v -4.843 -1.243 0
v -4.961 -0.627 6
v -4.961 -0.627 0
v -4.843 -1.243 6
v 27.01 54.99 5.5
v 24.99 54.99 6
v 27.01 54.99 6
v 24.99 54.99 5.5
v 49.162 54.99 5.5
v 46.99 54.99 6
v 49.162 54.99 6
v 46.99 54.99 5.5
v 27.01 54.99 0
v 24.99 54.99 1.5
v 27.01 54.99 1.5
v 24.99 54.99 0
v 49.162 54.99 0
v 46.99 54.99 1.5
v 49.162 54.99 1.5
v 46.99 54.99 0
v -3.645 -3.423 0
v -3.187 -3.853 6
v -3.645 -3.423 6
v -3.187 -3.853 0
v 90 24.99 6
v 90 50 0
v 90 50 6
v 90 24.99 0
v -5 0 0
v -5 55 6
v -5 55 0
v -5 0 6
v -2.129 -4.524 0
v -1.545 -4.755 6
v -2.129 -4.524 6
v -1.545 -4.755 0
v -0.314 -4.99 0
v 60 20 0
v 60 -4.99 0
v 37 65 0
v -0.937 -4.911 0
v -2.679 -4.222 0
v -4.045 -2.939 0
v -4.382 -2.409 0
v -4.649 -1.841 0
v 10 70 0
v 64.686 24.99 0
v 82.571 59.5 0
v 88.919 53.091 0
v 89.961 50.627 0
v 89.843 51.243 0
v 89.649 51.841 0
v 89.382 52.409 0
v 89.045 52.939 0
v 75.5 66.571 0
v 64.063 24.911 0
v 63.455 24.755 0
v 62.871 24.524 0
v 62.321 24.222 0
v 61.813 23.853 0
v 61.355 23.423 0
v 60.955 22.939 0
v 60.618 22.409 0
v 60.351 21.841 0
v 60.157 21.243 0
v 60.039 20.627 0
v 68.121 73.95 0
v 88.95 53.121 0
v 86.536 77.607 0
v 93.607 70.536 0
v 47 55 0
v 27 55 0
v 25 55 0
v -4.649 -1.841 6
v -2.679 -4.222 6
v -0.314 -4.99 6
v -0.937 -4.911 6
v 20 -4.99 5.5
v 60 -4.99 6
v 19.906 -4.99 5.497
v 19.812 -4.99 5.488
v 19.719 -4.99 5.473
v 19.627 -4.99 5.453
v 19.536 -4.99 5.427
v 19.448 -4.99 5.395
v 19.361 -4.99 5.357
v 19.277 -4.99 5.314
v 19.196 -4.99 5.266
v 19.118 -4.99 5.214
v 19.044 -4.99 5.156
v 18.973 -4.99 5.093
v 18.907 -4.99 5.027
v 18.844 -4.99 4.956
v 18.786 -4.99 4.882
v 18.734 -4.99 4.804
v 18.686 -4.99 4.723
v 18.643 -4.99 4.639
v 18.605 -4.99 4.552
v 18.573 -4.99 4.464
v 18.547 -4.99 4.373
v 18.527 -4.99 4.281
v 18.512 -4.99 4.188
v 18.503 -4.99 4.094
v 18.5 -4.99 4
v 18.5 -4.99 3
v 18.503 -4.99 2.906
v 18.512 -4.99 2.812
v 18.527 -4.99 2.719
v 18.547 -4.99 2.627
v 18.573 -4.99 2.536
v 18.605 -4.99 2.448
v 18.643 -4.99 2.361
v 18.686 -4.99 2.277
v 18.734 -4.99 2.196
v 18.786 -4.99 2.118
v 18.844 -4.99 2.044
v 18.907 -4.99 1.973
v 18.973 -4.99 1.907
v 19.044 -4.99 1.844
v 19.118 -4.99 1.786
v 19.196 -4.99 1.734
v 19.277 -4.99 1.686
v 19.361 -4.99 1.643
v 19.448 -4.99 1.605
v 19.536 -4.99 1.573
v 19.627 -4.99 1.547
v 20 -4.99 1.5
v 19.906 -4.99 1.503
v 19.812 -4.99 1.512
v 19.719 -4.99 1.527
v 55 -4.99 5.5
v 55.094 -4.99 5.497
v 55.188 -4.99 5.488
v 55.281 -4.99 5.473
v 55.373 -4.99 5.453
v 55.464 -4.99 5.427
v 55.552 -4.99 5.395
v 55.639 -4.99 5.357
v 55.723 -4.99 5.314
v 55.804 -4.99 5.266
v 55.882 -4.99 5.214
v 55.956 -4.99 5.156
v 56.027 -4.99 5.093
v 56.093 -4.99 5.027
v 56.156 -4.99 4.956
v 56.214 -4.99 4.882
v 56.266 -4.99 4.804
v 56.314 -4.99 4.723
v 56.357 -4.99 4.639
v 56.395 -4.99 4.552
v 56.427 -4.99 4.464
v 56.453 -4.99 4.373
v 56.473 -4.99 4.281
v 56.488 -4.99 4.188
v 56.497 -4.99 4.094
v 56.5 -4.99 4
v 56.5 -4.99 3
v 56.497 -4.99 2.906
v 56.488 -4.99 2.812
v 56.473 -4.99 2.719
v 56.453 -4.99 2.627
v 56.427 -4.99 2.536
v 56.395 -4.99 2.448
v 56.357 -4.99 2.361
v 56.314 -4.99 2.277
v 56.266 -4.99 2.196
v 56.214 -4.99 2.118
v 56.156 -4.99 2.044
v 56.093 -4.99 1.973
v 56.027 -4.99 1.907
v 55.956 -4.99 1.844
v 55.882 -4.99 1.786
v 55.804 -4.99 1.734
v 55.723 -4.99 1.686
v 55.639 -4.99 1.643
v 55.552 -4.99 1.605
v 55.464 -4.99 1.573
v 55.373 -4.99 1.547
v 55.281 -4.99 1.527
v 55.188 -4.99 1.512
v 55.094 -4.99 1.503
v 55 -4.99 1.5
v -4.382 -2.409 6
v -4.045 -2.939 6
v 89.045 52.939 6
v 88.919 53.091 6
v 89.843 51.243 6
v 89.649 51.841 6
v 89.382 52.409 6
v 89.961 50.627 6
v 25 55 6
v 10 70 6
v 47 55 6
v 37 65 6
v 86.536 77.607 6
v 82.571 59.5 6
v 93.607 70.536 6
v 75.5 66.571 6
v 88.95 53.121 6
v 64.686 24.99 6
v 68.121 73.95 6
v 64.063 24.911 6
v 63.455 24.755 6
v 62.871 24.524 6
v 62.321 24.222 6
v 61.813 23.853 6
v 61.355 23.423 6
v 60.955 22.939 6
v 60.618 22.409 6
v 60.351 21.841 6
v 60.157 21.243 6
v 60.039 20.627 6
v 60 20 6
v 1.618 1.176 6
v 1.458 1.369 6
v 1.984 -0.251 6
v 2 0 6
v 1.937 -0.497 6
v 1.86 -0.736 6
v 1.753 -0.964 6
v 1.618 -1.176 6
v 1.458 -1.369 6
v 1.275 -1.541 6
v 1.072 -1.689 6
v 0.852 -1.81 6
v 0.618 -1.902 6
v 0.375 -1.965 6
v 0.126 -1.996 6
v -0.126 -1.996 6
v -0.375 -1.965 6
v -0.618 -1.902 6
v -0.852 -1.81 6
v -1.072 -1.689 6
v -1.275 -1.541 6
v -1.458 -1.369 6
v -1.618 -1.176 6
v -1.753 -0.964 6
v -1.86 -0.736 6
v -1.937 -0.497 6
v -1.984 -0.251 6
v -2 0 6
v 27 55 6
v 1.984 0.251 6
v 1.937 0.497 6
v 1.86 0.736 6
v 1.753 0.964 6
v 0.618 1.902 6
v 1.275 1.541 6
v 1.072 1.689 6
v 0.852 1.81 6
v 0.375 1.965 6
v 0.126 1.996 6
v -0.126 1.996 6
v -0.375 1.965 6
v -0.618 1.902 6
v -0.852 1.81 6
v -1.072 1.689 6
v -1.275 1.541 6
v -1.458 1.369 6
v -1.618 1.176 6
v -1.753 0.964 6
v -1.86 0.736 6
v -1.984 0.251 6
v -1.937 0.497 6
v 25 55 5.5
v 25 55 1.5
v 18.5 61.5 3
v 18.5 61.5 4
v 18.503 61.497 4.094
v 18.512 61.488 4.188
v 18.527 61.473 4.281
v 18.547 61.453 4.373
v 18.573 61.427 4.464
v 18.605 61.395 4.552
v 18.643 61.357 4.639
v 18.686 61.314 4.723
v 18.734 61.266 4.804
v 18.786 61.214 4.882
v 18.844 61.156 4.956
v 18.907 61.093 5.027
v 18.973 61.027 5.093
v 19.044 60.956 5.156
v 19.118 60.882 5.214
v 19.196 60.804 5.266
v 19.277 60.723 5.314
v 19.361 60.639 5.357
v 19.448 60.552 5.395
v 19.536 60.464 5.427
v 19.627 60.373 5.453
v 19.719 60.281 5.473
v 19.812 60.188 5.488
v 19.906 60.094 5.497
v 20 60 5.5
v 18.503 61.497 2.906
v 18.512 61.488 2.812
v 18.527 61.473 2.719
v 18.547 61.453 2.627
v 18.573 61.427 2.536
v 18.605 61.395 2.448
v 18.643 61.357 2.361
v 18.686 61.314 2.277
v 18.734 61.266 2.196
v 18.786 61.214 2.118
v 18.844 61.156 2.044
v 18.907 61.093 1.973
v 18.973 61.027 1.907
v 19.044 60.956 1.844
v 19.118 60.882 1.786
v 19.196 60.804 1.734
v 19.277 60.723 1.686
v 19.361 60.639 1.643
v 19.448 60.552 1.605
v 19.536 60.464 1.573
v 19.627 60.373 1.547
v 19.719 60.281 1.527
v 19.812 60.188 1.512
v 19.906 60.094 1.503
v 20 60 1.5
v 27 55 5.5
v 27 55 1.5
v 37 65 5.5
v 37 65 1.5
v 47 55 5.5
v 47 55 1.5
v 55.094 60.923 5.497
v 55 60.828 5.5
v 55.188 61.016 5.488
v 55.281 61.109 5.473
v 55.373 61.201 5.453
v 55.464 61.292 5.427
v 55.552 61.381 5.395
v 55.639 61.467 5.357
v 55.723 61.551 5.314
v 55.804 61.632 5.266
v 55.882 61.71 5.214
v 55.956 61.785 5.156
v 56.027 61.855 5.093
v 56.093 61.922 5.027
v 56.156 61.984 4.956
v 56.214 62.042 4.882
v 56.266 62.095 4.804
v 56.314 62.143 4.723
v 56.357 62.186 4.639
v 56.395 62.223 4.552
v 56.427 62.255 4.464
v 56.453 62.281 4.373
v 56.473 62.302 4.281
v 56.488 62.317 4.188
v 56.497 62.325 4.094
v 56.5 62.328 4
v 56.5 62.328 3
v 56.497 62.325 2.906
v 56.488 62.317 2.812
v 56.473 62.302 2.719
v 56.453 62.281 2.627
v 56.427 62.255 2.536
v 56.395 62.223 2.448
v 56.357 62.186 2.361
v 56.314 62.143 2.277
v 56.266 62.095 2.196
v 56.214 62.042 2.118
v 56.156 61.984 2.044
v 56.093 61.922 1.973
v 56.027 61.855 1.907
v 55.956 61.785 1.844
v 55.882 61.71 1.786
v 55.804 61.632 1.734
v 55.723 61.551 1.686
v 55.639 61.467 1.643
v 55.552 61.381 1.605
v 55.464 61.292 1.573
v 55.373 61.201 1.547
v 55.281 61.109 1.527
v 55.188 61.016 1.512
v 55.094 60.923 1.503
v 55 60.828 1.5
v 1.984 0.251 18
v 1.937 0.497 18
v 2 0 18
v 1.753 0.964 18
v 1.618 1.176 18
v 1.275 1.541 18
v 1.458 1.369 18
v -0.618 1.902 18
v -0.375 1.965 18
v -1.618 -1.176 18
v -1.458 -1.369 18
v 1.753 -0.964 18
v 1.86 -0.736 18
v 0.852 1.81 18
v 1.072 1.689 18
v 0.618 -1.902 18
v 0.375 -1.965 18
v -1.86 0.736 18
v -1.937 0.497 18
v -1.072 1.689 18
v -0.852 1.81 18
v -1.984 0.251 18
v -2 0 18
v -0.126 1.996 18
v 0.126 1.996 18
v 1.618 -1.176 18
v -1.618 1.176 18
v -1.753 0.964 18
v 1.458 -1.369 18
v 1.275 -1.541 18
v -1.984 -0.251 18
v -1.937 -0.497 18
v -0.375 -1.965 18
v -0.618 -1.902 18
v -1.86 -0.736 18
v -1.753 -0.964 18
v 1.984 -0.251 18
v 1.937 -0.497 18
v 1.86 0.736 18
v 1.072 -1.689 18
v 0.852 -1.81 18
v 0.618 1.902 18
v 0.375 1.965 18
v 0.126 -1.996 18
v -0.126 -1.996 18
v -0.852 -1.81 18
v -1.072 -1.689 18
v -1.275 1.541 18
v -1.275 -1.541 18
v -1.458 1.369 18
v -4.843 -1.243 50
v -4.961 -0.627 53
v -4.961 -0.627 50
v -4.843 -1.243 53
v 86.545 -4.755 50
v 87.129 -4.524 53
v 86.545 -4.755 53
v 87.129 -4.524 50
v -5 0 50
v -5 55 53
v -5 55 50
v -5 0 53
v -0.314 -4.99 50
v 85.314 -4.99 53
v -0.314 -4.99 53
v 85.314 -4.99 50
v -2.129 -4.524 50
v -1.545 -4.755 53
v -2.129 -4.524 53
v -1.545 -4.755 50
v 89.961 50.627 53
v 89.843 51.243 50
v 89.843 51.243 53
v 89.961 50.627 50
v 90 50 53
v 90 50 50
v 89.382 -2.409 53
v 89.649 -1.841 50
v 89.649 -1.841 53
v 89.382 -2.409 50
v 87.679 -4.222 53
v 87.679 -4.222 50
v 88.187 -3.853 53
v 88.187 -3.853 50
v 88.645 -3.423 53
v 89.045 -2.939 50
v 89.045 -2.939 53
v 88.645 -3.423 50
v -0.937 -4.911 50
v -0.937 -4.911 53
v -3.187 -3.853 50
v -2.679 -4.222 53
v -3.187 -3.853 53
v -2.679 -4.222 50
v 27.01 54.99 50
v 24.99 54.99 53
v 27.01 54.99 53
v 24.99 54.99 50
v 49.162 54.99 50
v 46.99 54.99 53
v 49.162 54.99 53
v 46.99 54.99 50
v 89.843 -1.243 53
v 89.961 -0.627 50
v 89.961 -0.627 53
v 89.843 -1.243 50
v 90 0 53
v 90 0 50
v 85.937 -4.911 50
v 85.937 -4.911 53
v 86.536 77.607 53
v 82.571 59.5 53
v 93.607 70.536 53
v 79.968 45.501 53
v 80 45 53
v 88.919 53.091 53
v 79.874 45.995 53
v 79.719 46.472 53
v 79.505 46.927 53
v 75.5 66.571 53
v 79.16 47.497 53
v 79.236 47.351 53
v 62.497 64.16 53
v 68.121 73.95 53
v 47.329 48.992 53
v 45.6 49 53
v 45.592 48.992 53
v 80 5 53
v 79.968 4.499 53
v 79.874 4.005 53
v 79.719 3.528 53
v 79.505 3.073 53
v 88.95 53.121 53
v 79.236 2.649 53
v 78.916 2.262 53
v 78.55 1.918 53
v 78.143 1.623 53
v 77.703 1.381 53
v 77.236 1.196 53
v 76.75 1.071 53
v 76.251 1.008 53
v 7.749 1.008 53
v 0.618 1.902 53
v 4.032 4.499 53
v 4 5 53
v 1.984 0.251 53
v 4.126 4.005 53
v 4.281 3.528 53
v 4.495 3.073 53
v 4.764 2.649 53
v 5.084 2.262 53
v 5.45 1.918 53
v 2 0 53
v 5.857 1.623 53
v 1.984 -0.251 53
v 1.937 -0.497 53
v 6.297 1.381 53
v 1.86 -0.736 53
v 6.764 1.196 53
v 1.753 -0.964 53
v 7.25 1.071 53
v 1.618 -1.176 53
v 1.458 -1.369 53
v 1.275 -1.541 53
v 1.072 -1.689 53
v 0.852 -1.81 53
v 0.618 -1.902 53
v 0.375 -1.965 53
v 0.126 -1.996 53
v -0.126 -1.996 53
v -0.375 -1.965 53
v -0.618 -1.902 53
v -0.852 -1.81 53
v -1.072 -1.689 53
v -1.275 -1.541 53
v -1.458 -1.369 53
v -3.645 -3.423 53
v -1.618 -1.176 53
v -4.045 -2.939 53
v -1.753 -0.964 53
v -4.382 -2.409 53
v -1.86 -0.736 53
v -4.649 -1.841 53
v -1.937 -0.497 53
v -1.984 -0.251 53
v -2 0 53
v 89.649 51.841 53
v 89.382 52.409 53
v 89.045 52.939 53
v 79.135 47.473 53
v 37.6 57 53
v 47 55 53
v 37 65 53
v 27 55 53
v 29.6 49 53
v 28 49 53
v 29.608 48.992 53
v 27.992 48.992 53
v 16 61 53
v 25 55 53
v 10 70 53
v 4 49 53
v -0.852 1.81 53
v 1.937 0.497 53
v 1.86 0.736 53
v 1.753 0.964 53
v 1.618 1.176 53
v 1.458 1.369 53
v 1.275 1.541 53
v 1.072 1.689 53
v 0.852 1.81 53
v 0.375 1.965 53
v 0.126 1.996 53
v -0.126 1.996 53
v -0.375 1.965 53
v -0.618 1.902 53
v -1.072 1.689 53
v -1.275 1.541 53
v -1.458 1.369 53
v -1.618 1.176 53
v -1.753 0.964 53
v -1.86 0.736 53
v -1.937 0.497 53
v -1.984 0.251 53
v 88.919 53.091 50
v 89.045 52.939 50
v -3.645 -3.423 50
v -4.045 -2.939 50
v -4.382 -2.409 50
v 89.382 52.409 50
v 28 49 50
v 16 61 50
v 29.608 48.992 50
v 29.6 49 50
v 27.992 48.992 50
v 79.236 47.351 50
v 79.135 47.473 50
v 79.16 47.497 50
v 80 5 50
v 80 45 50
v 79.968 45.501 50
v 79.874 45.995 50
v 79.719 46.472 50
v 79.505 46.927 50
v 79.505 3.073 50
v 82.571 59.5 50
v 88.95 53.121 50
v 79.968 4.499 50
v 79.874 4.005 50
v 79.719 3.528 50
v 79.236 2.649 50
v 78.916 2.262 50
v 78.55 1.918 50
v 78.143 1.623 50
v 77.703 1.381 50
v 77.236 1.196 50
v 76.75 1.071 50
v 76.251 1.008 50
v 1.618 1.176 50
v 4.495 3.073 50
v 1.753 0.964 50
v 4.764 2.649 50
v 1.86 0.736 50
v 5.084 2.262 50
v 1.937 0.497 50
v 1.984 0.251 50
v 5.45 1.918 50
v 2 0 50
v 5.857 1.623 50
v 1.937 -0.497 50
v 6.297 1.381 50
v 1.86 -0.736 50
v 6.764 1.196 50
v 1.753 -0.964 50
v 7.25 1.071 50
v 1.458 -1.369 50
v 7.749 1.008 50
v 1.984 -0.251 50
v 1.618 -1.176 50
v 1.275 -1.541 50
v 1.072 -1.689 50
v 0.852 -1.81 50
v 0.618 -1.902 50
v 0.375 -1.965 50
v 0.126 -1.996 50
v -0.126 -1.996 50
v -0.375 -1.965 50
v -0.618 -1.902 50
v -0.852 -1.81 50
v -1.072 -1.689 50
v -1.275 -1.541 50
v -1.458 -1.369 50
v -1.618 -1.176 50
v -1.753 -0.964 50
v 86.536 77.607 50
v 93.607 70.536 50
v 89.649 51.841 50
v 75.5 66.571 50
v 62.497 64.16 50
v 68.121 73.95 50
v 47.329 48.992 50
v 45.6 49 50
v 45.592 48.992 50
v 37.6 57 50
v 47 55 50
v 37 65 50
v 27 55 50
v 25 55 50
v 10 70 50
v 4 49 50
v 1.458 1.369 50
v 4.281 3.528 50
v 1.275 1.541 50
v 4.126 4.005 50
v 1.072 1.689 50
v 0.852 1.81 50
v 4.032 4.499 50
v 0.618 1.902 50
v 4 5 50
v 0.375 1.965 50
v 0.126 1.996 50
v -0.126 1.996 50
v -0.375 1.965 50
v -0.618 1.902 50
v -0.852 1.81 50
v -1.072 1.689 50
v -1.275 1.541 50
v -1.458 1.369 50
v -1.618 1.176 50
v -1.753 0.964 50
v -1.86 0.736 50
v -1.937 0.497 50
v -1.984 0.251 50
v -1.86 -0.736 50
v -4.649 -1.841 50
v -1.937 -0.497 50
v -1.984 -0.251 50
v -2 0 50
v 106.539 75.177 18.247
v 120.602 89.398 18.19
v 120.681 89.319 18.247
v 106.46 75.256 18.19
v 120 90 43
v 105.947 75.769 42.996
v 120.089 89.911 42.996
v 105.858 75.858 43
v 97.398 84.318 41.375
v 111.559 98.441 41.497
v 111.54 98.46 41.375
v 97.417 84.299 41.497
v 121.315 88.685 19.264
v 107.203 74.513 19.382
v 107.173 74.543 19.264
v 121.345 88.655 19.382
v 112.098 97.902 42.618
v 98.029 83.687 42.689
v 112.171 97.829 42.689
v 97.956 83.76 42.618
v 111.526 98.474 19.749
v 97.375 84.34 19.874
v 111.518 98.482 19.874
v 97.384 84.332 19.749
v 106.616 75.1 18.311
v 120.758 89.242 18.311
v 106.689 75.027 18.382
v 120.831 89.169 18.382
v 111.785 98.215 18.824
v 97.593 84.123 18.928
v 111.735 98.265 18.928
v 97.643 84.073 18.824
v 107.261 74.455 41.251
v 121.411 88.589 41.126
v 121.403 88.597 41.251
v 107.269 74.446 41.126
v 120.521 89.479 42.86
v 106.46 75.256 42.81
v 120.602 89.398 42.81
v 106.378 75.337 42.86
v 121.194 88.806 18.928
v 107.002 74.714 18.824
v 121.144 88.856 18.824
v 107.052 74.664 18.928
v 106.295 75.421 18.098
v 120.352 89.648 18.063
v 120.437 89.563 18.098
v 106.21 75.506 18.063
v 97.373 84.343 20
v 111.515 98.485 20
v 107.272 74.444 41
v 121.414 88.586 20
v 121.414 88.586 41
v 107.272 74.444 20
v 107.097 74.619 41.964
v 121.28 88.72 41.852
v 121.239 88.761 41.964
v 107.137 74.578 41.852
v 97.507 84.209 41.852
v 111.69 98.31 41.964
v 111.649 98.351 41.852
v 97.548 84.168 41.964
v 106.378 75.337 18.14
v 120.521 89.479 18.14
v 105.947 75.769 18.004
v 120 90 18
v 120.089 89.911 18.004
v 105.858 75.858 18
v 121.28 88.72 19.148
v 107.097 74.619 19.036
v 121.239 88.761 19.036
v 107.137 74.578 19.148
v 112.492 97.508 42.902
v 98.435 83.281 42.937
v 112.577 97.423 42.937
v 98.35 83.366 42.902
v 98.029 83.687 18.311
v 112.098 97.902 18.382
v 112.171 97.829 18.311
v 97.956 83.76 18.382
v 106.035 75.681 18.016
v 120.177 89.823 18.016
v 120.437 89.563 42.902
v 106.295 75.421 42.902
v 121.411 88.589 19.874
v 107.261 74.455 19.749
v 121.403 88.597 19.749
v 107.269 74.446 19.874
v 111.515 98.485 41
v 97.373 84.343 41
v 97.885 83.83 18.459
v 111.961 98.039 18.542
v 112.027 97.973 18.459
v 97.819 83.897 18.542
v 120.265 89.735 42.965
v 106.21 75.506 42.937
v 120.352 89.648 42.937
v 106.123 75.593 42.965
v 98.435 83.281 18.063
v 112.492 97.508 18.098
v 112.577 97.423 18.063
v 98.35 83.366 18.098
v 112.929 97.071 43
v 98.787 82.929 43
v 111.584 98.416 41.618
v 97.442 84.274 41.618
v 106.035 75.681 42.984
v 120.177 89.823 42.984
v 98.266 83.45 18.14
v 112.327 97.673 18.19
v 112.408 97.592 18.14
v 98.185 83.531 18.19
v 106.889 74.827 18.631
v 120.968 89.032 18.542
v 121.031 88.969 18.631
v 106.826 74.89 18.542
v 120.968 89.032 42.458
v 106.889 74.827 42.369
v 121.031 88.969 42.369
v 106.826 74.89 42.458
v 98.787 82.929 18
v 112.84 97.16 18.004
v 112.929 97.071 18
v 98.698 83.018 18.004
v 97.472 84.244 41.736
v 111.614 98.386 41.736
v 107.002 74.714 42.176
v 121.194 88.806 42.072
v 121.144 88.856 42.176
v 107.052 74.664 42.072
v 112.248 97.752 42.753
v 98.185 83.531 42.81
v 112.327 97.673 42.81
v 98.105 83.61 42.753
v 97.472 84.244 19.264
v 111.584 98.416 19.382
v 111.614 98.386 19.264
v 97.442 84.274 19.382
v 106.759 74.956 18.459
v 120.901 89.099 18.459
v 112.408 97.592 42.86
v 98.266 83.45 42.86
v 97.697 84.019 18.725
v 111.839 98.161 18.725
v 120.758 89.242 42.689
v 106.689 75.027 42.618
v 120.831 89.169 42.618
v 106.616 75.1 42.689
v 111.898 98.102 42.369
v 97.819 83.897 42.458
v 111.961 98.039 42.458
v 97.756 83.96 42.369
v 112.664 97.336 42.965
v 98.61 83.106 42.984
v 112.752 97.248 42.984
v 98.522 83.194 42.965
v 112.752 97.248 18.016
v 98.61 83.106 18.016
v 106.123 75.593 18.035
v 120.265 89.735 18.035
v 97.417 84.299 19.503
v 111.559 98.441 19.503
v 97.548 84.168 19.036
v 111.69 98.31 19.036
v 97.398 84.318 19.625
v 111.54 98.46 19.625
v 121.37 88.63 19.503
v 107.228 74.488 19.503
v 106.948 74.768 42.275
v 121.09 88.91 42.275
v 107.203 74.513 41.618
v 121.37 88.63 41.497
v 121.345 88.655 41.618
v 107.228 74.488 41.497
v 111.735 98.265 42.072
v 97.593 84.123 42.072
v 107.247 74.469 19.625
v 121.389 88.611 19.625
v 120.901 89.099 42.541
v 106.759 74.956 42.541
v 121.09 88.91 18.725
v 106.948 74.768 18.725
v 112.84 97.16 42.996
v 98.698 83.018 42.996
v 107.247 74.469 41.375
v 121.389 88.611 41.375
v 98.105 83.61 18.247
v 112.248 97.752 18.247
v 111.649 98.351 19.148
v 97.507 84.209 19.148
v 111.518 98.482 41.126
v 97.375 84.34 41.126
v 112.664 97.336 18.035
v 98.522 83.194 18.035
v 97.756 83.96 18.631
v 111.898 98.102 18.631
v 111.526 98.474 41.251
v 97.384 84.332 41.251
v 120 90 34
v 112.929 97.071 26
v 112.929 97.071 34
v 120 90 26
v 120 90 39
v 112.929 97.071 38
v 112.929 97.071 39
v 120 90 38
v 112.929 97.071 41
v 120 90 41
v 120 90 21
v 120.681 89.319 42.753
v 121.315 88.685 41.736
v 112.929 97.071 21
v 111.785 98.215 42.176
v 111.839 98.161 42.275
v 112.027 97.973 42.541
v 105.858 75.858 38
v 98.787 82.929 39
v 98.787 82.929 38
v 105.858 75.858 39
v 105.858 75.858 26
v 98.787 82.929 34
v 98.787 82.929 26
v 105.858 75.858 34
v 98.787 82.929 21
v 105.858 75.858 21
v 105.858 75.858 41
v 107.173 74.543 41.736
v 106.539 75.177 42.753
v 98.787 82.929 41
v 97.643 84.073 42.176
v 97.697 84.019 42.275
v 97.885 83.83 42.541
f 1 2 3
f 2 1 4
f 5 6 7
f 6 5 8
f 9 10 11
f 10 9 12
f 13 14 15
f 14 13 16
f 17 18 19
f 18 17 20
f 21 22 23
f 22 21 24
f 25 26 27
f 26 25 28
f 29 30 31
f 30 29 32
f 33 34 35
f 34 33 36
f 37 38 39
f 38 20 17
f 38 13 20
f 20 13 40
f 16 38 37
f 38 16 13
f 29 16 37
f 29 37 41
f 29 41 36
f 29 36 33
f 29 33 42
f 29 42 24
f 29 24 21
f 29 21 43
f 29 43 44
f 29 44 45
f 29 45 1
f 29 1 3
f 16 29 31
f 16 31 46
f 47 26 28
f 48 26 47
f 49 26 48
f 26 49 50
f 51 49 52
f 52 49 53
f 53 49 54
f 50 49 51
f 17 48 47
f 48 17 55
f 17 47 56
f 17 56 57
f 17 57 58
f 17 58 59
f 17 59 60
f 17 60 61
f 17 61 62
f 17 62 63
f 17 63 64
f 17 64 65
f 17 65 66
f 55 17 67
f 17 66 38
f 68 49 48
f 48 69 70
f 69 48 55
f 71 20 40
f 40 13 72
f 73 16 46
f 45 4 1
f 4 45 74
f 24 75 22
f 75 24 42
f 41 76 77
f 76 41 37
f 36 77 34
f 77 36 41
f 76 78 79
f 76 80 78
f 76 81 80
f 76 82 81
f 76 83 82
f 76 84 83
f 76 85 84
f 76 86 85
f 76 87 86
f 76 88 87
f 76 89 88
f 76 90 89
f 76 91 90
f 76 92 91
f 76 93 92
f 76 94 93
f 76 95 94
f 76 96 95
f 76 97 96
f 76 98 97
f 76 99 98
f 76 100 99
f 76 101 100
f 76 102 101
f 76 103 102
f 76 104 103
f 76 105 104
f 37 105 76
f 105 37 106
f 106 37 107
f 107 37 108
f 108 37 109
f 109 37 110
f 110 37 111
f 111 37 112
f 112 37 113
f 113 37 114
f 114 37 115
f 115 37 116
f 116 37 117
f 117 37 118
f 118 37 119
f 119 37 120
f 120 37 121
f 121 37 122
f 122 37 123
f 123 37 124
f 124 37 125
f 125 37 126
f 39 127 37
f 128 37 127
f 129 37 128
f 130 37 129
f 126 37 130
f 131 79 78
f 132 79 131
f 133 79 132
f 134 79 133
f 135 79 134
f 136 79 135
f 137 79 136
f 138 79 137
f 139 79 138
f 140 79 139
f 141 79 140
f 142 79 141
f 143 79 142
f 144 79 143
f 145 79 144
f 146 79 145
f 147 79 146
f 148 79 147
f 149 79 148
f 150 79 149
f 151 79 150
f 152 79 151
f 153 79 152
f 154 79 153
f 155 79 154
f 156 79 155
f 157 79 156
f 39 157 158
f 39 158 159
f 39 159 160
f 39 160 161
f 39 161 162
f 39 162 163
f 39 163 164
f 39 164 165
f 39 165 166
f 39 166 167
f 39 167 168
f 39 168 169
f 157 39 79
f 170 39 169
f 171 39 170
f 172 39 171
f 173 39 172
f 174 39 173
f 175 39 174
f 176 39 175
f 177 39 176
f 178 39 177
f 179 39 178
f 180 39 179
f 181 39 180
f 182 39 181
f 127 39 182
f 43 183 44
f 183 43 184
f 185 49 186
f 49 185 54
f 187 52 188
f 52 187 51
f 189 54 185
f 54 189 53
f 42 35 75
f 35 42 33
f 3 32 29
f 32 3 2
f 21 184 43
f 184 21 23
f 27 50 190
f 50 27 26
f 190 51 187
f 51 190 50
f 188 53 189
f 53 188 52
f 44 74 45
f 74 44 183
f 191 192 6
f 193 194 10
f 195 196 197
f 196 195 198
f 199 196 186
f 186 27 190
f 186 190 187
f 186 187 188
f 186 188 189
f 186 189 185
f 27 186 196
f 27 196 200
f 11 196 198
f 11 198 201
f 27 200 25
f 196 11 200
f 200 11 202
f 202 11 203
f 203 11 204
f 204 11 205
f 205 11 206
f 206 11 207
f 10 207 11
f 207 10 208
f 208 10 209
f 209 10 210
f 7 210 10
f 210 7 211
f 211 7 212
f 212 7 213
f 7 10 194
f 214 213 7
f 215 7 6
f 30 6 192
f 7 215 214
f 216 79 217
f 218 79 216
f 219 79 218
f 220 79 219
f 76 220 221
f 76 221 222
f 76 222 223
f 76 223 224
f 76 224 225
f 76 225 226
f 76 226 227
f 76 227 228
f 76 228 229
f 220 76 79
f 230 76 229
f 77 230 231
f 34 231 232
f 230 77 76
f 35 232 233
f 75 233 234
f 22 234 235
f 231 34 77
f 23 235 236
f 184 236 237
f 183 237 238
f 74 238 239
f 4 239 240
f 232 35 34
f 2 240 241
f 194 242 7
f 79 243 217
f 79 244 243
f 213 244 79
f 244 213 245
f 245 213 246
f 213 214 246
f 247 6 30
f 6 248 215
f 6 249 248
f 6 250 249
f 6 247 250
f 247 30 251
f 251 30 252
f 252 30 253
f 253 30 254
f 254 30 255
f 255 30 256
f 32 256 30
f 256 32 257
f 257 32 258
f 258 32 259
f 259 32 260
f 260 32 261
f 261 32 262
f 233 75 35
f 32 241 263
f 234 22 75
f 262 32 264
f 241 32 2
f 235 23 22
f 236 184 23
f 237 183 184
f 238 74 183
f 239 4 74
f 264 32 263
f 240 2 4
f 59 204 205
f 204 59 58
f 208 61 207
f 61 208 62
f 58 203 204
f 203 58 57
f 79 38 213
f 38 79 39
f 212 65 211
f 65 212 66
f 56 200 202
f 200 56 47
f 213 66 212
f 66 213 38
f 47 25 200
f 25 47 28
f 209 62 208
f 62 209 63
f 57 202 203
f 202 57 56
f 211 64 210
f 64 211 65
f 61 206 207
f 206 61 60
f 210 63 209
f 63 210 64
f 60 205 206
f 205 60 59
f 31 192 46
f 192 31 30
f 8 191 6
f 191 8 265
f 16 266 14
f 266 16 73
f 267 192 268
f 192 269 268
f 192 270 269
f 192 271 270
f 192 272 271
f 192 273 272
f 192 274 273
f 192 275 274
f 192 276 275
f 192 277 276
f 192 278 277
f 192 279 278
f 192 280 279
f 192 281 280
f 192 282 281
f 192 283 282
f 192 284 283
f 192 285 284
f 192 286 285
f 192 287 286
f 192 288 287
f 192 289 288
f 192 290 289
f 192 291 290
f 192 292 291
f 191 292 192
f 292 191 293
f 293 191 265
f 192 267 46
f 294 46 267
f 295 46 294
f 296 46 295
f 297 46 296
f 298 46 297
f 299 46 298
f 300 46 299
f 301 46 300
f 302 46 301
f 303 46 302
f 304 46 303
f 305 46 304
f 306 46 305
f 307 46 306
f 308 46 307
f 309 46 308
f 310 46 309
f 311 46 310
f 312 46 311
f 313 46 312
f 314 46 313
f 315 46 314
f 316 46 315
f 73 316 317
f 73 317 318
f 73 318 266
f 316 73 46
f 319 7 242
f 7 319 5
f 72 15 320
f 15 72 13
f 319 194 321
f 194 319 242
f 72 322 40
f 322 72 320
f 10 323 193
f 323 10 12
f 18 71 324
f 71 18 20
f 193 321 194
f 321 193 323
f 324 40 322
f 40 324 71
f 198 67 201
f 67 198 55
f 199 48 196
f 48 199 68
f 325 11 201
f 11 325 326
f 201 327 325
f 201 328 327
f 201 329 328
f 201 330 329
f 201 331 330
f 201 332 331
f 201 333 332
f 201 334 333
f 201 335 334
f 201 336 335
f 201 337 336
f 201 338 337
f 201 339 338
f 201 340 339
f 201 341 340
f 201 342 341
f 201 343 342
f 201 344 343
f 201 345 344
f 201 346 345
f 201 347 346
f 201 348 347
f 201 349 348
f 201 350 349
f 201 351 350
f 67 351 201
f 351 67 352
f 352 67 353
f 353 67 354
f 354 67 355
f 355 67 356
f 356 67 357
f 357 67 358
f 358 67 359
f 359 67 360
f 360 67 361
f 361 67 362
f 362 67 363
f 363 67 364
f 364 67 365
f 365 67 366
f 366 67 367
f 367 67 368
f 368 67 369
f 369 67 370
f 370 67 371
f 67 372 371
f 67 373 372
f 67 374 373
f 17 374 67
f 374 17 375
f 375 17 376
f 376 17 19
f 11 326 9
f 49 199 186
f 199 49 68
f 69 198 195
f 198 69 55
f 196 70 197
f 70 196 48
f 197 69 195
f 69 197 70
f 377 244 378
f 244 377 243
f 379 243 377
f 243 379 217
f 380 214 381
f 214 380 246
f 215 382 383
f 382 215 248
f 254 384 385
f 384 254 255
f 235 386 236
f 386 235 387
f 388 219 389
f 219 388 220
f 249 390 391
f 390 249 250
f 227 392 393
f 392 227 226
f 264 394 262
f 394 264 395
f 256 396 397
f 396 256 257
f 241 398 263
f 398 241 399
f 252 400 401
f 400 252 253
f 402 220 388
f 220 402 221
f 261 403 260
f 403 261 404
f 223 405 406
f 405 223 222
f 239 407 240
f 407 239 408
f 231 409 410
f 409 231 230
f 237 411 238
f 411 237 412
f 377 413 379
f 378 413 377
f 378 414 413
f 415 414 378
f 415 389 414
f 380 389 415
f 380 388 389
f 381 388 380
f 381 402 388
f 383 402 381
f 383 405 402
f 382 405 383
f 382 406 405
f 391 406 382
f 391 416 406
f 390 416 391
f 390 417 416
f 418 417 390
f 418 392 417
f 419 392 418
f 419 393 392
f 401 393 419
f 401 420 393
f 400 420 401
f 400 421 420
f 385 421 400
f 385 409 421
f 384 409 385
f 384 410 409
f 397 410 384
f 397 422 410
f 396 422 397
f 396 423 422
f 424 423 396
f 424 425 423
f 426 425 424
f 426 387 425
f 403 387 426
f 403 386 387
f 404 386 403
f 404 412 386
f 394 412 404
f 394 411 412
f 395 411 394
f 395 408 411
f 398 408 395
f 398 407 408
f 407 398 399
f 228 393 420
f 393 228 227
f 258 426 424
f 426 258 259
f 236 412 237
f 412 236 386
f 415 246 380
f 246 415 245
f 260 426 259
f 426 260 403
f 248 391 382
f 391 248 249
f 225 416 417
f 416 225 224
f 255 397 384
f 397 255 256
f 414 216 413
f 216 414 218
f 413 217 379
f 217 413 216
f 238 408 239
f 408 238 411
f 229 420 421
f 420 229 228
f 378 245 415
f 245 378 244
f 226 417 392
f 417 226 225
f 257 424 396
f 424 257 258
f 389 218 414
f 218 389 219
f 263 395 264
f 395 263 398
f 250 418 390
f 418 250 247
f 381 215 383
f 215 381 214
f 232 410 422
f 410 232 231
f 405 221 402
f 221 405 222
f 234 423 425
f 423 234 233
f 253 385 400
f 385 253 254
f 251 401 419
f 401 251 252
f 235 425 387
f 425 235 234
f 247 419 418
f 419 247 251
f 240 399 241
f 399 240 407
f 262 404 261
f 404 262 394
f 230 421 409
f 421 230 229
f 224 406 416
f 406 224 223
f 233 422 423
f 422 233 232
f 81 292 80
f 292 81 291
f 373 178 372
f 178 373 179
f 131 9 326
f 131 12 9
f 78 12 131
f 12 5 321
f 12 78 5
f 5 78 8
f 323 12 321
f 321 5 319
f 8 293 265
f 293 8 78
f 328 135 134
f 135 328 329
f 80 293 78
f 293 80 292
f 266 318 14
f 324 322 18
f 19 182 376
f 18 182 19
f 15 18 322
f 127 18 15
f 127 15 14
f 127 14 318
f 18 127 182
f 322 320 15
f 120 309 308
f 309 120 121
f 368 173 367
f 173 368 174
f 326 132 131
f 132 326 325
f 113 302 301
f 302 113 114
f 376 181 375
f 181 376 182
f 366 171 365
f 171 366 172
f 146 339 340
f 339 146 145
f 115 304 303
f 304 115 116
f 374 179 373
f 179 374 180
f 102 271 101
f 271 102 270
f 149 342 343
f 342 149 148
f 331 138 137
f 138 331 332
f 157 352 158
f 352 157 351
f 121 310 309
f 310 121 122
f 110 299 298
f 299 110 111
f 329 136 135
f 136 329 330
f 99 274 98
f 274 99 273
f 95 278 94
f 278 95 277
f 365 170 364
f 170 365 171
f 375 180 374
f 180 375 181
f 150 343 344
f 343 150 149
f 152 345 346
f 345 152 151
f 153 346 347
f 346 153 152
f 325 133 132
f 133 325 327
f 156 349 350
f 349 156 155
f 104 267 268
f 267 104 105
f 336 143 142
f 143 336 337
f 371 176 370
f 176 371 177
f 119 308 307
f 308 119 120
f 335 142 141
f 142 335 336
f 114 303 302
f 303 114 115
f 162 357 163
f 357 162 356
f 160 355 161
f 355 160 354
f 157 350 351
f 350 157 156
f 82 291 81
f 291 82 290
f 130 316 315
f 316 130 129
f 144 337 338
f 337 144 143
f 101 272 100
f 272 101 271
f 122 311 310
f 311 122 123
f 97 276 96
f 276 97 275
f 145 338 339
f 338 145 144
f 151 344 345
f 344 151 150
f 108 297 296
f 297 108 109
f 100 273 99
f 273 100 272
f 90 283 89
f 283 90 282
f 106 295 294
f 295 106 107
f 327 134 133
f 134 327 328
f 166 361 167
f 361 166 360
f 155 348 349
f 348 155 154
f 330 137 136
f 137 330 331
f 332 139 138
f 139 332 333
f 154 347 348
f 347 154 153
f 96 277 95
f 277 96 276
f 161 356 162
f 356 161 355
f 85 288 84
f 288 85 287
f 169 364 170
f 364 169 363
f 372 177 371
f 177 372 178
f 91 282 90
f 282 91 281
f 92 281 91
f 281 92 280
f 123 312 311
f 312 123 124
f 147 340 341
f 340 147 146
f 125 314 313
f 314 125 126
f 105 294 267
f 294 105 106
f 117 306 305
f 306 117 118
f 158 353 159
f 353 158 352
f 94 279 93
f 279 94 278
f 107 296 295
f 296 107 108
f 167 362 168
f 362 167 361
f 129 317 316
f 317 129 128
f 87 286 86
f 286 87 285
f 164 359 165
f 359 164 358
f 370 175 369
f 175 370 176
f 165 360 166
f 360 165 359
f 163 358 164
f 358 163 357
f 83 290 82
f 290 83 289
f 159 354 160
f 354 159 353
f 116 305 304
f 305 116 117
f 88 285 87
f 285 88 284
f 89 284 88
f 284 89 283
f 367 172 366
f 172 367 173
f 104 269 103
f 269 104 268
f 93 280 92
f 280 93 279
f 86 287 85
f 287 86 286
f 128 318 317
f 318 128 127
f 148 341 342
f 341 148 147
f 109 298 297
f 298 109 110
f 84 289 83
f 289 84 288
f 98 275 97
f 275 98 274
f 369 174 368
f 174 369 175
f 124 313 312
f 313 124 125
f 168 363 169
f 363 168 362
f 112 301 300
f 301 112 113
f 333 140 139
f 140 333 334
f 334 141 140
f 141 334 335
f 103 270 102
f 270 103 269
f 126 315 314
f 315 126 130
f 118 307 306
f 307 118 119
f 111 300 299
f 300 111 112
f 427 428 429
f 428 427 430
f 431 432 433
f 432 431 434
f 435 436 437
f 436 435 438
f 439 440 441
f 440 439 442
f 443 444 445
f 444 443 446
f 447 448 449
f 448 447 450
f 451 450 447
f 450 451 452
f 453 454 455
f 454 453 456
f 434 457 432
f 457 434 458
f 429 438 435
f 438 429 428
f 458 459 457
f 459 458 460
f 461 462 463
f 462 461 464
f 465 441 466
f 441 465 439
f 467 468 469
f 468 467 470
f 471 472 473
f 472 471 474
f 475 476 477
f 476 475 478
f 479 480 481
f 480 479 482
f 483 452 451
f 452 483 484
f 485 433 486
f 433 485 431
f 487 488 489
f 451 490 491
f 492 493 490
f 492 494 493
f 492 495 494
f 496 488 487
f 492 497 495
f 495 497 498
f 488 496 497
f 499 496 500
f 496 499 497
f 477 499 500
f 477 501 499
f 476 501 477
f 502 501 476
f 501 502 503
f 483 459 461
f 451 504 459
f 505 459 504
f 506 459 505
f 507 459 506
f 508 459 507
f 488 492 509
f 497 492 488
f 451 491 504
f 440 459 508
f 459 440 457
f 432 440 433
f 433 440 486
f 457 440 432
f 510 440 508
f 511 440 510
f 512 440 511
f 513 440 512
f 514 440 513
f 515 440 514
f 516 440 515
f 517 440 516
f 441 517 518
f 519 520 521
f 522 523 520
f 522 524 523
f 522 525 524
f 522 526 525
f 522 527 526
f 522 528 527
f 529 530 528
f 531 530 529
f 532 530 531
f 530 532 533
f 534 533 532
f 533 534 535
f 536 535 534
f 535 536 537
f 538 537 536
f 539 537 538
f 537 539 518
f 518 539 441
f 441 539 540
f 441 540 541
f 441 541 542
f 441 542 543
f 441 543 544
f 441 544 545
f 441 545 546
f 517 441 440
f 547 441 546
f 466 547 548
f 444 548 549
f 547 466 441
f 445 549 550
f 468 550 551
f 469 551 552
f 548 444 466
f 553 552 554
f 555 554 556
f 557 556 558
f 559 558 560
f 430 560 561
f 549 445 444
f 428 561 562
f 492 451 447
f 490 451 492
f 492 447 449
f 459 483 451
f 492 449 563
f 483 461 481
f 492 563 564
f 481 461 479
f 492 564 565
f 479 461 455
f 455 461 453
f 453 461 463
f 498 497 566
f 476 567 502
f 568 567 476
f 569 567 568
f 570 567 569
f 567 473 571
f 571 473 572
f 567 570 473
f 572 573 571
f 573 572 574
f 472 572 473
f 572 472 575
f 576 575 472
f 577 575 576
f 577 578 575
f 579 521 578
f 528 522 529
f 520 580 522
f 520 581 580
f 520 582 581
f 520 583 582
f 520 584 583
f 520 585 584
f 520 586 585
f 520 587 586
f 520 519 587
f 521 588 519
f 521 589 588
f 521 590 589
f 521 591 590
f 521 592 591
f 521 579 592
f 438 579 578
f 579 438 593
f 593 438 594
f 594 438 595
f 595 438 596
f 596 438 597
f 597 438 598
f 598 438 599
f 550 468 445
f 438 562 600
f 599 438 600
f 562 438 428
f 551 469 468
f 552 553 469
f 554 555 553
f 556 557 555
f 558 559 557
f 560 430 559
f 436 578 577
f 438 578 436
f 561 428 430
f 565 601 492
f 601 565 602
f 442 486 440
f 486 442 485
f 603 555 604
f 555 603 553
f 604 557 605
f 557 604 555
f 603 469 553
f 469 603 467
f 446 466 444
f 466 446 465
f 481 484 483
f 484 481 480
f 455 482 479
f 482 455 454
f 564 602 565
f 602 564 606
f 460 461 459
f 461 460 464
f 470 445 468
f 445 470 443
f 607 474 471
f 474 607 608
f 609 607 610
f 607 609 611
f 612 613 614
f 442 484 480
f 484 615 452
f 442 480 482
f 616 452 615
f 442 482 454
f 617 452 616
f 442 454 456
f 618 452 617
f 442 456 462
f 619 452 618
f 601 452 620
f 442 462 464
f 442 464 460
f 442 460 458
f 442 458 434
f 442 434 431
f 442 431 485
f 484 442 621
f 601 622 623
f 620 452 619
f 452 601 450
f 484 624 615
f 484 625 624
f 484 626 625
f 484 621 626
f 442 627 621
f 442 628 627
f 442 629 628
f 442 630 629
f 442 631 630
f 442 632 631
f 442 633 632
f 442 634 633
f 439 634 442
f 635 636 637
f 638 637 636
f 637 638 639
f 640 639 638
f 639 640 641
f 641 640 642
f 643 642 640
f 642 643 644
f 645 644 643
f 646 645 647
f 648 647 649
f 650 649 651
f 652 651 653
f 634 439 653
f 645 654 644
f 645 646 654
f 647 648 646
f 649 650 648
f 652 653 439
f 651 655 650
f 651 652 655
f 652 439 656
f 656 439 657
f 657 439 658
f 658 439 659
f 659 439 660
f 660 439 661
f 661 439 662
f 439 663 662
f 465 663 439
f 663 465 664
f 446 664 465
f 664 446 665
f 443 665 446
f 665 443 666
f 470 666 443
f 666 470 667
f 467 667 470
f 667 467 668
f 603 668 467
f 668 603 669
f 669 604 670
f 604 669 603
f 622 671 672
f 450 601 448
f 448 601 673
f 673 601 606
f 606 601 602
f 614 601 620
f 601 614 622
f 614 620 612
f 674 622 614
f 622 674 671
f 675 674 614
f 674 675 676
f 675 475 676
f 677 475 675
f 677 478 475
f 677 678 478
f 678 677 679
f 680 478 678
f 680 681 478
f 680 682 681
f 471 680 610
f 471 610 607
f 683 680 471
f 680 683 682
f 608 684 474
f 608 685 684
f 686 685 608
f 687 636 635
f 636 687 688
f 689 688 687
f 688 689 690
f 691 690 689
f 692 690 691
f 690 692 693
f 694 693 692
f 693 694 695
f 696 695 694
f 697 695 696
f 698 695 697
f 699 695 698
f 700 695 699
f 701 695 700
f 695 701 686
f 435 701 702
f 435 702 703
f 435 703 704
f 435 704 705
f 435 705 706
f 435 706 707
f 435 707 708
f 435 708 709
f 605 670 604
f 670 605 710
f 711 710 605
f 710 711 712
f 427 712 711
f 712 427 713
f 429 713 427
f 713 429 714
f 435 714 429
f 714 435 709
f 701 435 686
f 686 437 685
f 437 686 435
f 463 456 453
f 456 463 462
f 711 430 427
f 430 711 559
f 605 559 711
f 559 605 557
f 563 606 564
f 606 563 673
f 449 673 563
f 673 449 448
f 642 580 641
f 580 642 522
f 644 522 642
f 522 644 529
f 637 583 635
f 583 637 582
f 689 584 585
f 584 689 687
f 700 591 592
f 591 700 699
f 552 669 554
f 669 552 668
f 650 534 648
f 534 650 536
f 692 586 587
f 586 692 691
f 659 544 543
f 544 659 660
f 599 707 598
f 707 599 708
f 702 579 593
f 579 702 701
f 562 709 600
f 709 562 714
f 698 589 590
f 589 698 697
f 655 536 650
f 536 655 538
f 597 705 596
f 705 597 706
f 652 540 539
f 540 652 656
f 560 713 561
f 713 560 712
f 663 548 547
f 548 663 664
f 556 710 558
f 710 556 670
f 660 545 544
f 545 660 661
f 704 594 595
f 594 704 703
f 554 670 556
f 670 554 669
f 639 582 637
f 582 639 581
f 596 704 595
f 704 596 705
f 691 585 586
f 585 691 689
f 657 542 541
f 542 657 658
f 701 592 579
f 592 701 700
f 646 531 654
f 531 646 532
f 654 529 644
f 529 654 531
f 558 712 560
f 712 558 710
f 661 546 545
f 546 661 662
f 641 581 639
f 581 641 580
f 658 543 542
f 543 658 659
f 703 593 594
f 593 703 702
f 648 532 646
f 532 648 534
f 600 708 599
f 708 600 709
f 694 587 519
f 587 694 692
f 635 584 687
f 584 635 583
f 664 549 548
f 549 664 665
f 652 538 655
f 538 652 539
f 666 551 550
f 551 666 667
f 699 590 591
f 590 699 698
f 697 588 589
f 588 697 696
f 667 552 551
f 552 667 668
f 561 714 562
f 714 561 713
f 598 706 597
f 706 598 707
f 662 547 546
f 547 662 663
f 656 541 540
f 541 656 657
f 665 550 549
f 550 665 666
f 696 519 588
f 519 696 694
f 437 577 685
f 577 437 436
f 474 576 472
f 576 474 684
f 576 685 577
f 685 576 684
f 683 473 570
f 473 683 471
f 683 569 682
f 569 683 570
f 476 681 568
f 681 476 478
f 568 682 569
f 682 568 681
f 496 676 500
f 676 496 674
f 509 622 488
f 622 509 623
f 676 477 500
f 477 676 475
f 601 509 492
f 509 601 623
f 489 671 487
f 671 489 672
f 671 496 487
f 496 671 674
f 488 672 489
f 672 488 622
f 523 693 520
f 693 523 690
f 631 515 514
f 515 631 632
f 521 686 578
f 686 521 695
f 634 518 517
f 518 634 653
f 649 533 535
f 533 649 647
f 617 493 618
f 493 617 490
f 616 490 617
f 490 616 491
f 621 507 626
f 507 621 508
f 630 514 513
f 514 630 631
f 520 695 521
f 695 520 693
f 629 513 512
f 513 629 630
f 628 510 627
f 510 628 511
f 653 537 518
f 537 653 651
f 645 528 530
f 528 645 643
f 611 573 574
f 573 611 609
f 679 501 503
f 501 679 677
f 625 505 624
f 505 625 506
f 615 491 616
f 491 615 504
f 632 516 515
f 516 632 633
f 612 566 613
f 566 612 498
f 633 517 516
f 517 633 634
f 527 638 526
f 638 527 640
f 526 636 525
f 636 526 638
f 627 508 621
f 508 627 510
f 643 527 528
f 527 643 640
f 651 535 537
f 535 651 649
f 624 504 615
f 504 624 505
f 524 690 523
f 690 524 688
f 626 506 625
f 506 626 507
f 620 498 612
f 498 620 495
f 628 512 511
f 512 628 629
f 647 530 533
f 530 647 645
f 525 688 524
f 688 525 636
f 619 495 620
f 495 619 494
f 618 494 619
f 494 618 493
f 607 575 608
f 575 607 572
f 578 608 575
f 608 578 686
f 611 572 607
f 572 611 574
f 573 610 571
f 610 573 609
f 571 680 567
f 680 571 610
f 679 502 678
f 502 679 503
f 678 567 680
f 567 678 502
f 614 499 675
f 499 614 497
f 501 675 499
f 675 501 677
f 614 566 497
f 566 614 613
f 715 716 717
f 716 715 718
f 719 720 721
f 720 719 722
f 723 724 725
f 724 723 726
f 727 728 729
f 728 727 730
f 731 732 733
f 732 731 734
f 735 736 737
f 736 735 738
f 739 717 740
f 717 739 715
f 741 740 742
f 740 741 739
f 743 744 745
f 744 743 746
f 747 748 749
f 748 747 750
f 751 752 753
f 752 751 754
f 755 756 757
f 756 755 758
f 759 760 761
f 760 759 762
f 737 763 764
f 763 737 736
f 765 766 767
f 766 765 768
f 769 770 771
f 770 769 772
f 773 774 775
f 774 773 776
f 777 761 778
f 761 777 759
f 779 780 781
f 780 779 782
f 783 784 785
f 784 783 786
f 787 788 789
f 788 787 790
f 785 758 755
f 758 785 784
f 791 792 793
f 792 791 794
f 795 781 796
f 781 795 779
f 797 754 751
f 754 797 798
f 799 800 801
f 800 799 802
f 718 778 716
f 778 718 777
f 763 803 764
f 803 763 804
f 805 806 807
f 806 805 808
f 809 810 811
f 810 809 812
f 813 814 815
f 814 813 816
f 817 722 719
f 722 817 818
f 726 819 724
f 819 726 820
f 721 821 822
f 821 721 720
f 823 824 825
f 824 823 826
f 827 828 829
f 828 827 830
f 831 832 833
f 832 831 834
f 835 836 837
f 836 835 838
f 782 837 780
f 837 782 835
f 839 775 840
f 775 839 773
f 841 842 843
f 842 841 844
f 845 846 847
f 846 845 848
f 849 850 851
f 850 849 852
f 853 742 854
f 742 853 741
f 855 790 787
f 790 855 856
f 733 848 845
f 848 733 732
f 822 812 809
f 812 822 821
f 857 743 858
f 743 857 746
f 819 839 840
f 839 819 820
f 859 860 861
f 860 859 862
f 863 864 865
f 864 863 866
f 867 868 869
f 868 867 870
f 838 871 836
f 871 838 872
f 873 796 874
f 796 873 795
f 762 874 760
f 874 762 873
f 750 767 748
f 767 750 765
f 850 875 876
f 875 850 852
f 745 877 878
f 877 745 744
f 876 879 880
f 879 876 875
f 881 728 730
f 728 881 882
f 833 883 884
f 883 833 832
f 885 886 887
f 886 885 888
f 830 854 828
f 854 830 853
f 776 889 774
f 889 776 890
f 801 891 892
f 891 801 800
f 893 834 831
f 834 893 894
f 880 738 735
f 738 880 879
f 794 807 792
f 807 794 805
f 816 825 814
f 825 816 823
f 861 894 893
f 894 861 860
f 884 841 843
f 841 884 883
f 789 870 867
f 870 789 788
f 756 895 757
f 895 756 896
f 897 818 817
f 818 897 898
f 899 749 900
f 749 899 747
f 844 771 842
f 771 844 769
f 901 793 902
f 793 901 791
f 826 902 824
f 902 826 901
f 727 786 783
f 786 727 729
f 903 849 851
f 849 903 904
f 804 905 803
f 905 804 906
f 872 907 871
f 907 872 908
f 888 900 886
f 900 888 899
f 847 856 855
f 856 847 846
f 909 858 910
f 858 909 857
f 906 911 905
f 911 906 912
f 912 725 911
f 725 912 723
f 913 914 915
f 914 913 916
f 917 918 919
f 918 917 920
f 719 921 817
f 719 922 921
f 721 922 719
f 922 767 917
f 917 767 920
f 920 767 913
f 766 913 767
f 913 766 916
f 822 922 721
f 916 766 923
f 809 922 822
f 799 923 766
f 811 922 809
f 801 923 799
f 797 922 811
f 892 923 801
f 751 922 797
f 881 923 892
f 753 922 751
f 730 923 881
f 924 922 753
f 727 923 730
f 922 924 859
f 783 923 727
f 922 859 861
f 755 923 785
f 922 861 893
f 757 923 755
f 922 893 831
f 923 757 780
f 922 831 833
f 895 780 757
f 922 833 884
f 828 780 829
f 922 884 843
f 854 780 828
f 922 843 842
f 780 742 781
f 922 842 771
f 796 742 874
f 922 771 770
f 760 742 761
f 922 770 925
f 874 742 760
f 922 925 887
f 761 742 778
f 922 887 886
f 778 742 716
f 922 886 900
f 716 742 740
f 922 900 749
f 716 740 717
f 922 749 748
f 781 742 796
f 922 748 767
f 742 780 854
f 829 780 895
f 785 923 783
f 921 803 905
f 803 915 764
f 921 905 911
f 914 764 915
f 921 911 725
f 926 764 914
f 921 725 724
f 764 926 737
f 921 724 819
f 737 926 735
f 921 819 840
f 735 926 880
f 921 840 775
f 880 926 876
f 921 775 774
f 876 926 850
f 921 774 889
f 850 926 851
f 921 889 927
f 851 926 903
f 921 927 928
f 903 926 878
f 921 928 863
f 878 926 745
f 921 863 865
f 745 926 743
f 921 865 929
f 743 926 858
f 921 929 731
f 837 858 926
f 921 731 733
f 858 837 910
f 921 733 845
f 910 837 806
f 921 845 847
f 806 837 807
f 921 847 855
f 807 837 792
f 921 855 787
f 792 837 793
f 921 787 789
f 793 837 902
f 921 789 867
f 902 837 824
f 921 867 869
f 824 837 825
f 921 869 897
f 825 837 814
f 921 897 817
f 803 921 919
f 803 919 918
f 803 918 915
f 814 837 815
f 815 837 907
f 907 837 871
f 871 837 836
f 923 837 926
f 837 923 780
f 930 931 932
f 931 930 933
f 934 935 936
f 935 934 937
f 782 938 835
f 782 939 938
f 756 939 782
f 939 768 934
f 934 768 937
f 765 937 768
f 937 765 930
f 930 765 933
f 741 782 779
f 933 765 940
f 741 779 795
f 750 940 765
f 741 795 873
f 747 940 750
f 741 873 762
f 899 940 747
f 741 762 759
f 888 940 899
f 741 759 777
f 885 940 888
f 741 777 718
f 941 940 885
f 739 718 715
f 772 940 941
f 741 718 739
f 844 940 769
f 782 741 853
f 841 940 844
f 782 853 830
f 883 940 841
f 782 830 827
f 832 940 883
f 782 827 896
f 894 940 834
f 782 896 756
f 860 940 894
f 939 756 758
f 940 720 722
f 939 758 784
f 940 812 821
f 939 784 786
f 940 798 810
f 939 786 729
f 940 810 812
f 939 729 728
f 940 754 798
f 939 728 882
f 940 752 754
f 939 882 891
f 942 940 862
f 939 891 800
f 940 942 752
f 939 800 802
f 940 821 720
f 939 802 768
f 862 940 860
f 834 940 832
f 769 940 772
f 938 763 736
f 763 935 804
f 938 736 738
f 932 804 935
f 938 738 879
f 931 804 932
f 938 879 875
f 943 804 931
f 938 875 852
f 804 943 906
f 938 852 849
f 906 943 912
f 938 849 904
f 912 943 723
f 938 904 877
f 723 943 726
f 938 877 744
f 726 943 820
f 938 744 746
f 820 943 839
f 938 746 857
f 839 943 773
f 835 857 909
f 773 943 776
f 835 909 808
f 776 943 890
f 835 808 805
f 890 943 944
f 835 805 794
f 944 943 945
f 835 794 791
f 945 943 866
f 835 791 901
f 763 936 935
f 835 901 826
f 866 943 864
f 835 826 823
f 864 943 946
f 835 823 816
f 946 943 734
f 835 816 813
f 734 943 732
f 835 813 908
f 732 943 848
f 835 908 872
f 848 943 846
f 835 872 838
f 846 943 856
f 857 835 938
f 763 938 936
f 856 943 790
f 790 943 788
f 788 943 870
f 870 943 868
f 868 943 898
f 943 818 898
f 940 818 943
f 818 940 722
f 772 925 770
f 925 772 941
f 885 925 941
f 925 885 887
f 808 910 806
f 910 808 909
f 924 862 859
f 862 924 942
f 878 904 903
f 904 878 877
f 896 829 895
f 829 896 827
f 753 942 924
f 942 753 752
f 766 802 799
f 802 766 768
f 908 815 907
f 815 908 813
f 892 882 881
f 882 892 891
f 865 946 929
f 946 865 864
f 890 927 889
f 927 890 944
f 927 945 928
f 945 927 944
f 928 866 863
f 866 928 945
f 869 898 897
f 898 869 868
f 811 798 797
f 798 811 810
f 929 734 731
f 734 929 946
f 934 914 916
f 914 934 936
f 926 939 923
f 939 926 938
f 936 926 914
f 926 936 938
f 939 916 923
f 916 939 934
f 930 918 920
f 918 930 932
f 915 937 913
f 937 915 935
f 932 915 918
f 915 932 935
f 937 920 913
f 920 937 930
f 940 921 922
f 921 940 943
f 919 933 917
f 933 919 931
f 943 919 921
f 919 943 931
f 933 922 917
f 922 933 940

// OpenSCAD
module bottom(){
    $fn=50;
    difference(){
        union(){
            difference(){
                minkowski(){
                    cube([85,50,5], center = false);
                    cylinder(r=5);
                }
                translate([65,-10,-1])minkowski(){
                    cube([30,30,7], center = false);
                    cylinder(r=5);
                }
            }
            translate([-5,49,0])cube([2,6,6],center = false);
            translate([10,55,3])rotate([0,0,45])cube([15*sqrt(2),15*sqrt(2),6],center = true);
            translate([37,55,3])rotate([0,0,45])cube([10*sqrt(2),10*sqrt(2),6],center = true);
            translate([66,51,3])rotate([0,0,45])cube([10+18*sqrt(2),18*sqrt(2)+4,6],center = true);
            translate([83,67,3])rotate([0,0,45])cube([20,10,6],center = true);
            cylinder(r=2, h=18, center = false);
        }
        translate([0,70,3])hole();
    }
}
module hole(){
    $fn=100;
    rotate([90,0,0])translate([20,0,-2])minkowski(){
        cube([35,1,50],center=false);
        cylinder(r=1.5,h=50,center=false);
    }
}
module top0(){
    $fn=50;
    difference(){
        minkowski(){
            cube([85,50,2], center = false);
            cylinder(r=5);
        }
        //translate([0,0,-1])cylinder(r=2, h=5,center=false);
    }
    translate([-5,49,0])cube([2,6,3],center = false);
    translate([10,55,1.5])rotate([0,0,45])cube([15*sqrt(2),15*sqrt(2),3],center = true);
    translate([37,55,1.5])rotate([0,0,45])cube([10*sqrt(2),10*sqrt(2),3],center = true);
    translate([66,51,1.5])rotate([0,0,45])cube([10+18*sqrt(2),18*sqrt(2)+4,3],center = true);
    //translate([83,67,1.5])rotate([0,0,45])cube([20,10,3],center = true);
}
module top1(){
    $fn=50;
    difference(){
        minkowski(){
            cube([85,50,2], center = false);
            cylinder(r=5);
        }
        translate([0,0,-1])cylinder(r=2, h=5,center=false);
    }
    translate([-5,49,0])cube([2,6,3],center = false);
    translate([10,55,1.5])rotate([0,0,45])cube([15*sqrt(2),15*sqrt(2),3],center = true);
    translate([37,55,1.5])rotate([0,0,45])cube([10*sqrt(2),10*sqrt(2),3],center = true);
    translate([66,51,1.5])rotate([0,0,45])cube([10+18*sqrt(2),18*sqrt(2)+4,3],center = true);
    translate([83,67,1.5])rotate([0,0,45])cube([20,10,3],center = true);
}
module top(){
    difference(){
        top1();
        translate([8,5,-0.1])scale([0.8,0.8,1.1])top0();
    }
}
module linker(){
    difference(){
        $fn=100;
        minkowski(){
            cube([21,10,15],center=false);
            cylinder(r=2,h=5,center=false);
        }
        translate([1,0,-1])cube([5,10,100]);
        translate([14,0,-1])cube([4,10,100]);
        translate([19,0,-1])cube([2,10,100]);
    }
}

bottom();
translate([0,0,50])top();
translate([120,90,20])rotate([90,270,-45])linker();
